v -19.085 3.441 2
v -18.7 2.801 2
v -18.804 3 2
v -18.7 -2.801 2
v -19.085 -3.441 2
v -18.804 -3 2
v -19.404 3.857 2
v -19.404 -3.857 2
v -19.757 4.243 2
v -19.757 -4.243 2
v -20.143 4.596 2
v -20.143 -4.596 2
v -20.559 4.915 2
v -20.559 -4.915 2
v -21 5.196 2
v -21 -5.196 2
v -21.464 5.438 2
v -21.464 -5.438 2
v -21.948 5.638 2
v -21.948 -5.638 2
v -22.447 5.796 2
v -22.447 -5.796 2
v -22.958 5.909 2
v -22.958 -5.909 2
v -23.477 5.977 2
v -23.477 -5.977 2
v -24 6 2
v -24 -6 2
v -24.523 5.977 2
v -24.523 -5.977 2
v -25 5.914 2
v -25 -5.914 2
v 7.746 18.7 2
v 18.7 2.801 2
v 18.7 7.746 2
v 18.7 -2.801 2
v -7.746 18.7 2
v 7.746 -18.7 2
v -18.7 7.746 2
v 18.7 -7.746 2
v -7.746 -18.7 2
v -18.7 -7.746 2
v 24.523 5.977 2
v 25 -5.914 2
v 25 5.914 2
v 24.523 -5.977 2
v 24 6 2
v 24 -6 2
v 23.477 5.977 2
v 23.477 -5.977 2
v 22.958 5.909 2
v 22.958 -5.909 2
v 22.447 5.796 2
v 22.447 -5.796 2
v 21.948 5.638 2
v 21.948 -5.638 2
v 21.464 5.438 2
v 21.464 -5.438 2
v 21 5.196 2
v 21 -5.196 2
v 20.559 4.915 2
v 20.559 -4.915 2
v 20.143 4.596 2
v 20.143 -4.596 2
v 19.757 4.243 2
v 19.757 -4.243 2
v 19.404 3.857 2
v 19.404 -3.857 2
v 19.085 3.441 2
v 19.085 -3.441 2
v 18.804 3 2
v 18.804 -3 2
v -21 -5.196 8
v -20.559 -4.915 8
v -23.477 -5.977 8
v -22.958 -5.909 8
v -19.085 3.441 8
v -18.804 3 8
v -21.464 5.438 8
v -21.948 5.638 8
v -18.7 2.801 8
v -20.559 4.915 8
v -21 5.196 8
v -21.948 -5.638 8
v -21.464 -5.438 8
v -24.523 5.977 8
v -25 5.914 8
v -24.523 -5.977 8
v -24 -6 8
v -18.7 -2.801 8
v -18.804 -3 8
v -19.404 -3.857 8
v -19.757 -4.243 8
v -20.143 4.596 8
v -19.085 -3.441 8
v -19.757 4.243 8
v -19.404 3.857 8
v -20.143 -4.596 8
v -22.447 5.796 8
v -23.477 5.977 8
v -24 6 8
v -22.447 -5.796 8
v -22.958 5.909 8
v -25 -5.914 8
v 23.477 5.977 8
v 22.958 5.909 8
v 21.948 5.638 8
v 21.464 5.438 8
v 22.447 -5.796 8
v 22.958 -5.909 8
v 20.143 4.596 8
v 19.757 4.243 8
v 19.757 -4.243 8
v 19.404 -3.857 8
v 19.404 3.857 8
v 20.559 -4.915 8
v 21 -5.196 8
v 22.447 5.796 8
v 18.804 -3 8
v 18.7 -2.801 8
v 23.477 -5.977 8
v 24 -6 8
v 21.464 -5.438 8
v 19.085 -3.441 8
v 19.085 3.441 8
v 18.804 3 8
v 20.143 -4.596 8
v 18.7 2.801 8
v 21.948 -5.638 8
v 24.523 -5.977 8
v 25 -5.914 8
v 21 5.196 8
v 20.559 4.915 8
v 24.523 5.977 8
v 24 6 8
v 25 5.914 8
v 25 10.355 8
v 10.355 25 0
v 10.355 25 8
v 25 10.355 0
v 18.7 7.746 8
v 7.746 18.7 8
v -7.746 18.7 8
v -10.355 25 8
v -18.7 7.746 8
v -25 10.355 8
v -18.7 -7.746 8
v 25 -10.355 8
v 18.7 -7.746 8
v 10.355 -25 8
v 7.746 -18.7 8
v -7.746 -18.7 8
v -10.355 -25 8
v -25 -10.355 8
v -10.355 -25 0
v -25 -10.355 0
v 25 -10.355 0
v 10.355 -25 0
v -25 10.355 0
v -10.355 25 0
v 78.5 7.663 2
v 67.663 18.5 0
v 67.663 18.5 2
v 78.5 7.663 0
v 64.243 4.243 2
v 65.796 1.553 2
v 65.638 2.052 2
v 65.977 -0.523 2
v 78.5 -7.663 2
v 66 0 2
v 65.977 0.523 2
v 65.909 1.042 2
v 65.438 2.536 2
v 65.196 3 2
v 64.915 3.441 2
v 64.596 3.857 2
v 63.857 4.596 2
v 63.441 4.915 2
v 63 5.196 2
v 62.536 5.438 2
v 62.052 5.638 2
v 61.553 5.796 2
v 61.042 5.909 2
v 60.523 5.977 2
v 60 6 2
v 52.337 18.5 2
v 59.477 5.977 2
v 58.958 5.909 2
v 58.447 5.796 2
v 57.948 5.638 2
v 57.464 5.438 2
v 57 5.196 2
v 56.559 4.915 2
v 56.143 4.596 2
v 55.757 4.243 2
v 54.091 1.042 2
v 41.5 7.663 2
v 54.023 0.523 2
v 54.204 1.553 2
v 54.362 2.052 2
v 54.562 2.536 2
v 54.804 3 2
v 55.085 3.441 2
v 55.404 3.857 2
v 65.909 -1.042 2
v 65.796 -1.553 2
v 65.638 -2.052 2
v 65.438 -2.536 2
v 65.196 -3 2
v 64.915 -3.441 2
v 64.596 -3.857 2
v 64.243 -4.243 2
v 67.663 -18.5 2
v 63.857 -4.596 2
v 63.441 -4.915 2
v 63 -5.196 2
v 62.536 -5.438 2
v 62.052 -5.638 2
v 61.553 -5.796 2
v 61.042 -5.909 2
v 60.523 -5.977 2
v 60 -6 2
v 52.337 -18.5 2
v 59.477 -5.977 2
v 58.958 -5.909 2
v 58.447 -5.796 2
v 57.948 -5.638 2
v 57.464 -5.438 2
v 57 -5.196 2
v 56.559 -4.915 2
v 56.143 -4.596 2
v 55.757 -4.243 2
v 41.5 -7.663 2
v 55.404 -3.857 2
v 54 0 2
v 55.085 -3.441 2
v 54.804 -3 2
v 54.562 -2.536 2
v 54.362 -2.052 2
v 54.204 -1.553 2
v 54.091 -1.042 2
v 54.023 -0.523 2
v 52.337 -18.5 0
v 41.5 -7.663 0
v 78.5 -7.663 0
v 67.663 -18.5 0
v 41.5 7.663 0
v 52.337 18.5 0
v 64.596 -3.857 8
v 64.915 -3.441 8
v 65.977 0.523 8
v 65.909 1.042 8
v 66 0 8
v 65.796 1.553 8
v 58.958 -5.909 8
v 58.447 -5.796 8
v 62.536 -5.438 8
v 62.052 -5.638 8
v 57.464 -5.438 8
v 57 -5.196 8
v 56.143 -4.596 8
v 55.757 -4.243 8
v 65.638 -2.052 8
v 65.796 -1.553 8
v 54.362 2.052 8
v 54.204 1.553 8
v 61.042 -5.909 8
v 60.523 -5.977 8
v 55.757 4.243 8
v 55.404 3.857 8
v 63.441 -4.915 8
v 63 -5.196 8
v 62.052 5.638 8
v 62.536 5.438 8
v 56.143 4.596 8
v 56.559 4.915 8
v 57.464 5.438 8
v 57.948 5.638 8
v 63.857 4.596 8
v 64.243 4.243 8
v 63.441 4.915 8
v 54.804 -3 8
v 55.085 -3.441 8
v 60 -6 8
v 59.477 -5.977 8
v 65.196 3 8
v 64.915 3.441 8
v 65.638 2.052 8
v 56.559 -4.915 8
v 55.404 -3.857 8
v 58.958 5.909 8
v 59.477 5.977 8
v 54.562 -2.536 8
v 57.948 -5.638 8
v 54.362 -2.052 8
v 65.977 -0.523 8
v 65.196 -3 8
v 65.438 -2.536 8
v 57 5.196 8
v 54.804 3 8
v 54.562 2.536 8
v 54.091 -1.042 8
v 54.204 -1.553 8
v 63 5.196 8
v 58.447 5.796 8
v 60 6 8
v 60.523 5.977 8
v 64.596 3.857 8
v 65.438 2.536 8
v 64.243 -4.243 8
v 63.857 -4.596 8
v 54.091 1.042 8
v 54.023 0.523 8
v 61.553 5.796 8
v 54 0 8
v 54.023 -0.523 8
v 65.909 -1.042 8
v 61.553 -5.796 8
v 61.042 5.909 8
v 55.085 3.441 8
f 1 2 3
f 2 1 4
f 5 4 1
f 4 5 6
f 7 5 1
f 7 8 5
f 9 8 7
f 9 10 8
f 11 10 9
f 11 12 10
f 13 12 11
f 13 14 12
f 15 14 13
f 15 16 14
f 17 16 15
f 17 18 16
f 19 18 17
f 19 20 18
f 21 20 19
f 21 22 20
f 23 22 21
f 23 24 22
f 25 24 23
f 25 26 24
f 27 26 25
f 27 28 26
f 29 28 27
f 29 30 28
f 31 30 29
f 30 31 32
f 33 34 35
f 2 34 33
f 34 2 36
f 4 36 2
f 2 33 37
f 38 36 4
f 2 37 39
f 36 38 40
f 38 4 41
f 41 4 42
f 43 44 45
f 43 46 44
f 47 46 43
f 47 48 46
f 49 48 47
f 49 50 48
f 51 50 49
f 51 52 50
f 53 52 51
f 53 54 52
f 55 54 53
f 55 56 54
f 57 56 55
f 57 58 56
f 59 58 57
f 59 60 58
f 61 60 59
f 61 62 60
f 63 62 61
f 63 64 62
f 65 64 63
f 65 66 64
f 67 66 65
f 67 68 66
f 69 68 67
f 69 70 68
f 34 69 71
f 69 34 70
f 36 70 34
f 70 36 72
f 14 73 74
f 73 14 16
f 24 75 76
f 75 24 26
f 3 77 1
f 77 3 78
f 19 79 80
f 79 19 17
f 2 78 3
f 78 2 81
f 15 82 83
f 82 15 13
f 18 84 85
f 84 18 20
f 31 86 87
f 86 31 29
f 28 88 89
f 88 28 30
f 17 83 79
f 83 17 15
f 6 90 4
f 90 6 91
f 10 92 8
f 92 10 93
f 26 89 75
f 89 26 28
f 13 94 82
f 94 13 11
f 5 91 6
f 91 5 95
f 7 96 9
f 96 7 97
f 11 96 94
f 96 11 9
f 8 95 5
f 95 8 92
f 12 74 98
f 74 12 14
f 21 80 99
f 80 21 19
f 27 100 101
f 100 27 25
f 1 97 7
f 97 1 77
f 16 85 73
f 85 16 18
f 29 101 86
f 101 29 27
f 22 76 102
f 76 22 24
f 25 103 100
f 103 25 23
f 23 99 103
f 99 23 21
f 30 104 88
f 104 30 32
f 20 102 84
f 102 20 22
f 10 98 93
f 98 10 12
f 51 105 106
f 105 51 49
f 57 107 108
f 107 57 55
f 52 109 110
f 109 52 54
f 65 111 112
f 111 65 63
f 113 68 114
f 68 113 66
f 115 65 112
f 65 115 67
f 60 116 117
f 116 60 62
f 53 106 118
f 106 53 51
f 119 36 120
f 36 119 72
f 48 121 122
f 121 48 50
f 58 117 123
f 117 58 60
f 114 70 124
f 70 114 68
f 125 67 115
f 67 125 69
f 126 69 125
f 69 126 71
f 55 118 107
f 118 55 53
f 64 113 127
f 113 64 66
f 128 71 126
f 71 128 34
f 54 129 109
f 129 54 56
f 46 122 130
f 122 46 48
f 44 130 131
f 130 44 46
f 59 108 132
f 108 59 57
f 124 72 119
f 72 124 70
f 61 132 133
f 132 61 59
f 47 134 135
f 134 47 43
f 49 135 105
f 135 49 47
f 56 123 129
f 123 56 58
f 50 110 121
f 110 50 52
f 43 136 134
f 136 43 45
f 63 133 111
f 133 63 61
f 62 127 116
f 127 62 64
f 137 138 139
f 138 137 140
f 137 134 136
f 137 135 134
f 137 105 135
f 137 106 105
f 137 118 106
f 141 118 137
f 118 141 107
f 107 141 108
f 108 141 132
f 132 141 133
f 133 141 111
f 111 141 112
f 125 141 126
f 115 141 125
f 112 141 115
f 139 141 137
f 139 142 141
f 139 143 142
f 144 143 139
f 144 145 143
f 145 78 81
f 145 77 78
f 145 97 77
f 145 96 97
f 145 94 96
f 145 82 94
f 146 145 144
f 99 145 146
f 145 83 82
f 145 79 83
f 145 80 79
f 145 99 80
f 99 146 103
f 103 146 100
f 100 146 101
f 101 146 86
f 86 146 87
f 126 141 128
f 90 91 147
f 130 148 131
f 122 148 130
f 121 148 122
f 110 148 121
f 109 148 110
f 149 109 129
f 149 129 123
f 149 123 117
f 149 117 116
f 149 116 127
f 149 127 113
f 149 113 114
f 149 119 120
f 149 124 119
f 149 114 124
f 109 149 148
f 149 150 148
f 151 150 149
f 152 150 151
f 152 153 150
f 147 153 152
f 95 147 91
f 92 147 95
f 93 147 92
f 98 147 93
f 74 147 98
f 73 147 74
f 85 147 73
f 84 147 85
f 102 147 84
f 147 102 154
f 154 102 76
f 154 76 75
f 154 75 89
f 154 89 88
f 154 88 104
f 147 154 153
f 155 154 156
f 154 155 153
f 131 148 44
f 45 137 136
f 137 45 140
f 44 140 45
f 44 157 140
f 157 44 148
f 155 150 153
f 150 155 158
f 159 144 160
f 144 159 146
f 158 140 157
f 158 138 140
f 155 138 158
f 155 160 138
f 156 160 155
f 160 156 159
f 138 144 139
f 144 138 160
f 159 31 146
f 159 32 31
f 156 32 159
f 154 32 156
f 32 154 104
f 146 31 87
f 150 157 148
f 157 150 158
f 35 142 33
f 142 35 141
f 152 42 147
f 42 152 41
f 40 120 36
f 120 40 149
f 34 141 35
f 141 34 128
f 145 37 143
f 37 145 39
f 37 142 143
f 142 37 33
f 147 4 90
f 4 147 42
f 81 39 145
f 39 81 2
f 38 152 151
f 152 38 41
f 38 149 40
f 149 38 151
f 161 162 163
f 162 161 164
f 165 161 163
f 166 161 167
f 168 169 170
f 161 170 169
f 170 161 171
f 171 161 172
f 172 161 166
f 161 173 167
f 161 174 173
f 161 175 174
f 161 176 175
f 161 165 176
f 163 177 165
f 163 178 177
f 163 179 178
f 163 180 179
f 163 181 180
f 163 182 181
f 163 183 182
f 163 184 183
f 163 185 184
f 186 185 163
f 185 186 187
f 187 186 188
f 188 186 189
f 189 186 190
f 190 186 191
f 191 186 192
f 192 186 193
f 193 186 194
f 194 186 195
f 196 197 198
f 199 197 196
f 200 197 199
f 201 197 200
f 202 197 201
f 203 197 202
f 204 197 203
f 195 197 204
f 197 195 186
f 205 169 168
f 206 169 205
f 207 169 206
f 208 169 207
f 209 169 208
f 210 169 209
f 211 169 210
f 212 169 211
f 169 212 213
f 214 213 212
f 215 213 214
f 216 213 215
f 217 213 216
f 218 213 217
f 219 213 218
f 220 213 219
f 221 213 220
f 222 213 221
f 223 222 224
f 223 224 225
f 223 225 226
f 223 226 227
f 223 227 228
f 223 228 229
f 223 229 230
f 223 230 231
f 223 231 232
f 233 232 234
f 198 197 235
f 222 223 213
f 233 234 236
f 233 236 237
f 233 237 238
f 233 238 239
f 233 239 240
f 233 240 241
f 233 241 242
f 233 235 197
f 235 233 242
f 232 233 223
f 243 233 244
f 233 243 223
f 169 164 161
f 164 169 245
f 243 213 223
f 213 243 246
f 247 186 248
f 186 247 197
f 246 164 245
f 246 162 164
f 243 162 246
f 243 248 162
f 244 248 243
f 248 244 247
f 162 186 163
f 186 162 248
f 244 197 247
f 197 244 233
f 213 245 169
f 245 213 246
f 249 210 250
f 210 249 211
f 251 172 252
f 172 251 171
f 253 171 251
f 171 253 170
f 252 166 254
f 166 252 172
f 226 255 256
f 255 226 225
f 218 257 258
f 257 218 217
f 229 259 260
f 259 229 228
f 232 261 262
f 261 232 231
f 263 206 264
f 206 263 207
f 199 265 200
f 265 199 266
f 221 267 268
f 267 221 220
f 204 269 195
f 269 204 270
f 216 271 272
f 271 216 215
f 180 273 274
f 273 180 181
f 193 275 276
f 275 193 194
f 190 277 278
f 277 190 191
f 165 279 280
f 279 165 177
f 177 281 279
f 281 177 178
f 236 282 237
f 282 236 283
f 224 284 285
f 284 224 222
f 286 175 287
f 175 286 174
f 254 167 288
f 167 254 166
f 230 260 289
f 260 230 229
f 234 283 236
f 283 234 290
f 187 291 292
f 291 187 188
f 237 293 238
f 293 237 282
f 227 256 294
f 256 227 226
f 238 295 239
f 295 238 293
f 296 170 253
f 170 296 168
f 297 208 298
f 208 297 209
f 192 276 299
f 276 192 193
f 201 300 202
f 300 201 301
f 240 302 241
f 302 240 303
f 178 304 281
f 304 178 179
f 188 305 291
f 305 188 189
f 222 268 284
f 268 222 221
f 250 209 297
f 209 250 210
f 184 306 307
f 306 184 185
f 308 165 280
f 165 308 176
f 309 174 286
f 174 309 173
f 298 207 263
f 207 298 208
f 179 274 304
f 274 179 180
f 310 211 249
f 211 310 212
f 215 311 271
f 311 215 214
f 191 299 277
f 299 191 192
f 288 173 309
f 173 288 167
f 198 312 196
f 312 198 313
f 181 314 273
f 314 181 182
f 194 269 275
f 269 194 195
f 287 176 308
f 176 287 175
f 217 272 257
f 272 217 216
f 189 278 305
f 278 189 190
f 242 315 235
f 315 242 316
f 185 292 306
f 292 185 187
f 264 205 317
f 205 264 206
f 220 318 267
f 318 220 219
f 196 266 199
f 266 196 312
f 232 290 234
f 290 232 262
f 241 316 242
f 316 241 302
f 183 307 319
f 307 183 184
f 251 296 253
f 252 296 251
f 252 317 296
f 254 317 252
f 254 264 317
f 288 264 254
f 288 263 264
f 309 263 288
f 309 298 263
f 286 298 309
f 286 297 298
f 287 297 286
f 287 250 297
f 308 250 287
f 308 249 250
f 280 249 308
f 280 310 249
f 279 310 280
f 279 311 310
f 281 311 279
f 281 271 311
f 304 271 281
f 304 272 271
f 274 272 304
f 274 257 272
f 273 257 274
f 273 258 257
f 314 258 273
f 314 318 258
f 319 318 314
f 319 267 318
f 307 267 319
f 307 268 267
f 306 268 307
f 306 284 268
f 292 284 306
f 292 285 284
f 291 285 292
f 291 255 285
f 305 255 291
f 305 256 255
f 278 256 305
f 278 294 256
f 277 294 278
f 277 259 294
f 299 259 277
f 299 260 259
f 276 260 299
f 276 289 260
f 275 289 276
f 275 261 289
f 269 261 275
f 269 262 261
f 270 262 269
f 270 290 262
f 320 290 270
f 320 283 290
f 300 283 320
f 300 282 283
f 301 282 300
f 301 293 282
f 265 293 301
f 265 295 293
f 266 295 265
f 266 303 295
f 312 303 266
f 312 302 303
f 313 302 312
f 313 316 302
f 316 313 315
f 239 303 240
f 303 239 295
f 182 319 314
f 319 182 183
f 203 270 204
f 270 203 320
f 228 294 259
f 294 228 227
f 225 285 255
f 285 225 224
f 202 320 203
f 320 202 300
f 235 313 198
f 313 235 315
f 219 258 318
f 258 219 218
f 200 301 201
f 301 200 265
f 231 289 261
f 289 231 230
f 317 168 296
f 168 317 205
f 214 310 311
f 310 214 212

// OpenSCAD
// NFC talisman assembly jig. Dimensions mm; print fit is unverified.
// Tray: 50mm across flats, 8mm high, 37.4mm pocket, 6mm deep, 2mm floor.
// Two 12mm finger openings leave the floor intact. Press plate is separate.
$fn = 72;
function octagon(af) = let(h=af/2,b=h*tan(22.5))
    [[-b,-h],[b,-h],[h,-b],[h,b],[b,h],[-b,h],[-h,b],[-h,-b]];
module tray() {
    difference() {
        linear_extrude(8) polygon(octagon(50));
        translate([0,0,2]) linear_extrude(6.1) polygon(octagon(37.4));
        for (x=[-24,24]) translate([x,0,2]) cylinder(h=6.1,d=12);
    }
}
module press_plate() {
    linear_extrude(2) polygon(octagon(37));
    translate([0,0,2]) cylinder(h=6,d=12);
}
tray();
translate([60,0,0]) press_plate();
